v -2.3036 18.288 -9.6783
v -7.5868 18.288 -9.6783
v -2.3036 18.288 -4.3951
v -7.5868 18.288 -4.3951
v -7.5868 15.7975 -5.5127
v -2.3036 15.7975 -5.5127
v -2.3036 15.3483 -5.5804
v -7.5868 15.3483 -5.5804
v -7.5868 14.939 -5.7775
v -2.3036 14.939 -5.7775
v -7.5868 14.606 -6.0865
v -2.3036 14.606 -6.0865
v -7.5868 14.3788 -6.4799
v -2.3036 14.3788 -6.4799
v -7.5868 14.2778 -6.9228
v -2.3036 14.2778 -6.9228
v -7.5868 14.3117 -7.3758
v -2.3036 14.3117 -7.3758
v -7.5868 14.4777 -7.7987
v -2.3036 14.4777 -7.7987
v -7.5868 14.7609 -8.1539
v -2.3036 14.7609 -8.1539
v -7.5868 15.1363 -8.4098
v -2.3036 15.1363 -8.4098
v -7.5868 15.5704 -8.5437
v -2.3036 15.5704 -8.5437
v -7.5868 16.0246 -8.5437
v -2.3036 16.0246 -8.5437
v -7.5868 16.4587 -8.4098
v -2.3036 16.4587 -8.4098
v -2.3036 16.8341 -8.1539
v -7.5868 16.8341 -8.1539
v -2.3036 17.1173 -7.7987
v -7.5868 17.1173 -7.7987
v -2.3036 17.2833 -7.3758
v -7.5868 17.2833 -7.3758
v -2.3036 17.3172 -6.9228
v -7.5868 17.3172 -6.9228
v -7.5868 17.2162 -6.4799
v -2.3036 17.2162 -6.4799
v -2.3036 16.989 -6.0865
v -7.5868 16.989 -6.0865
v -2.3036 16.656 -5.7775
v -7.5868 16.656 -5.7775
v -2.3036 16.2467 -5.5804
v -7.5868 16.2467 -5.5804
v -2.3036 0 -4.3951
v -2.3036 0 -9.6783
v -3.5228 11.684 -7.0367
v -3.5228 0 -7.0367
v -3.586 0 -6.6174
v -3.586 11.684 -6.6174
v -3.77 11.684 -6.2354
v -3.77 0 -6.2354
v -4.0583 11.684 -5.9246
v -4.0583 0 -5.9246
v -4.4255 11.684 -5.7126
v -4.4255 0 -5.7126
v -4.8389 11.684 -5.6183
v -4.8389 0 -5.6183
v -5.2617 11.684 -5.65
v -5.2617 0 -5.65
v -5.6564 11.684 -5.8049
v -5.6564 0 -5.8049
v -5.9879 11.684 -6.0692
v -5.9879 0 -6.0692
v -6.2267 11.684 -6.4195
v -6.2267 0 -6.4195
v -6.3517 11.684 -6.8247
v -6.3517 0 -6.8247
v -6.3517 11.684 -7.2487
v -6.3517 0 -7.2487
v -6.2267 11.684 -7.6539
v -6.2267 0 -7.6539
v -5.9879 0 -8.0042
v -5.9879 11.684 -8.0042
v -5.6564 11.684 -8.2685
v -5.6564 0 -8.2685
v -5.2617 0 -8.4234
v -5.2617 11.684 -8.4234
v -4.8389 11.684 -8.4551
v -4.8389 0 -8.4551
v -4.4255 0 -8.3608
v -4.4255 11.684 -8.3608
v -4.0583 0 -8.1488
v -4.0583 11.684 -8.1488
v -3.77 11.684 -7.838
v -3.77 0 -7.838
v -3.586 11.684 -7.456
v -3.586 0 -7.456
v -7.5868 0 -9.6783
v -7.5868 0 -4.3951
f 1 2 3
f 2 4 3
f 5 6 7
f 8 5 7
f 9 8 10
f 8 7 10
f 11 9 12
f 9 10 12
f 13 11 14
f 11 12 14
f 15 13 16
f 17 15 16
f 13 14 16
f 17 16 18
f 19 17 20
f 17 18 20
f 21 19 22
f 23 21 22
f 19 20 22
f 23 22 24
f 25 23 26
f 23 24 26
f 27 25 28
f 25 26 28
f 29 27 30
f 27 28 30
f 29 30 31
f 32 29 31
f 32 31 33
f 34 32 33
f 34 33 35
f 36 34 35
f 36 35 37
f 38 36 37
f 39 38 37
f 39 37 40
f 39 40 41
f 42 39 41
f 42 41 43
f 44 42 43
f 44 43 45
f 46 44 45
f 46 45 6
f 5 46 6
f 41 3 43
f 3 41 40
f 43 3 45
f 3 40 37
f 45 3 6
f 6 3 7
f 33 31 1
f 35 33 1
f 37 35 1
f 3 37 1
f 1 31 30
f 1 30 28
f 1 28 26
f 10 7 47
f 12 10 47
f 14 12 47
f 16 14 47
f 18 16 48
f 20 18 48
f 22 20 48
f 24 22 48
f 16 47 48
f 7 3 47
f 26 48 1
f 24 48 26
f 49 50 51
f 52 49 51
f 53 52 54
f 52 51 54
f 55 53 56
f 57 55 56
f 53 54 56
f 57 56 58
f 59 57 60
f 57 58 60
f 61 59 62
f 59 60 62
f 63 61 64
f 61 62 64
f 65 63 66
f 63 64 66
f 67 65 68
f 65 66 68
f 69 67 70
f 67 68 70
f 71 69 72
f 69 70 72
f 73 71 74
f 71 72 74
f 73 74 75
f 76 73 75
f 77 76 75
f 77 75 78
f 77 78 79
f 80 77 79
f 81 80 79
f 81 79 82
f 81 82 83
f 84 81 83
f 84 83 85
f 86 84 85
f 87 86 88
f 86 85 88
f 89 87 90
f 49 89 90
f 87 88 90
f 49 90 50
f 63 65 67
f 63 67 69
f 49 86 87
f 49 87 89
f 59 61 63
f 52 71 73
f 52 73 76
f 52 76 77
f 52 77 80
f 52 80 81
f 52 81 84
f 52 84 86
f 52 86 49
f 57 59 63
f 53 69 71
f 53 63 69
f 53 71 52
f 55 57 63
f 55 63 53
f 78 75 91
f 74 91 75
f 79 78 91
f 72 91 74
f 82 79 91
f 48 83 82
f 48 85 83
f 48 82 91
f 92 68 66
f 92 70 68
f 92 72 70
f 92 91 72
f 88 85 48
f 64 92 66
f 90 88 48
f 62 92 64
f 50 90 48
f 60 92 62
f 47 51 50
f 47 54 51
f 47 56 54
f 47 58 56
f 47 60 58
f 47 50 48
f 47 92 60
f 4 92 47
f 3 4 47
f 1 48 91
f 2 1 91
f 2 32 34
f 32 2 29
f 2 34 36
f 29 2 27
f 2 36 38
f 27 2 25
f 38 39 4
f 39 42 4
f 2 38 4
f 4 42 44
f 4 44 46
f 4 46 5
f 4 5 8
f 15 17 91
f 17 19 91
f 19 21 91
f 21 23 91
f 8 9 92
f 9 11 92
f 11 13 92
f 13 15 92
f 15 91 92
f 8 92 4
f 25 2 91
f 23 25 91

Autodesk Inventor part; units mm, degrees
ref_plane "YZ Plane" through (0, 0, 0) normal (1, 0, 0) x (0, 1, 0)
ref_plane "XZ Plane" through (0, 0, 0) normal (0, 1, 0) x (-1, 0, 0)
ref_plane "XY Plane" through (0, 0, 0) normal (0, 0, 1) x (1, 0, 0)
ref_plane "Work Plane2" through (-2.3036, 0, -9.6783) normal (1, 0, 0) x (0, 0, -1)
sketch "Sketch1" plane through (-2.3036, 0, -9.6783) normal (1, 0, 0) x (0, 0, -1)
  line L0 (0, 0) -> (-5.2832, 0) projected
  line L1 (-2.6416, 0) -> (-2.6416, 10.3378)
  line L2 (-2.6416, 10.3378) -> (-2.6416, 11.1315)
  line L3 (-2.6416, 0) -> (-2.6416, 11.5316)
  point P0 (-9.6783, 0)
  dimension "d24" = 11.5316
ref_plane "Work Plane1" through (-2.3036, 0, -9.6783) normal (1, 0, 0) x (0, 0, -1)
sketch "Sketch2" plane through (-2.3036, 0, -9.6783) normal (1, 0, 0) x (0, 0, -1)
  point P0 (-9.6783, 0)
ref_plane "Work Plane3" through (-2.3036, 0, -9.6783) normal (1, 0, 0) x (0, 0, -1)
ref_plane "Work Plane6" through (-7.5868, 0, -9.6783) normal (-1, 0, 0) x (0, 0, 1)
sketch "Sketch5" plane through (-7.5868, 0, -9.6783) normal (-1, 0, 0) x (0, 0, 1)
  line L0 (0, 0) -> (5.2832, 0) projected
  line L1 (2.6416, 0) -> (2.6416, 14.7688)
  line L2 (2.6416, 14.7688) -> (2.6416, 15.7975)
  line L3 (2.6416, 15.7975) -> (2.6416, 18.2867)
  circle A0 centre (2.6416, 15.7975) radius 1.524
  point P0 (9.6783, 0)
  dimension "d25" = 1.0287
  dimension "d26" = 2.4892
  dimension "d27" = 3.048
ref_plane "Work Plane5" through (-7.5868, 0, -9.6783) normal (0, -1, 0) x (1, 0, 0)
sketch "Sketch6" plane through (-7.5868, 0, -9.6783) normal (0, -1, 0) x (1, 0, 0)
  line L0 (0, 0) -> (0, 5.2832) projected
  line L1 (5.2832, 0) -> (0, 0) projected
  line L2 (0, 5.2832) -> (5.2832, 5.2832)
  line L3 (5.2832, 5.2832) -> (5.2832, 0)
  line L4 (5.2832, 0) -> (0, 0)
  line L5 (0, 0) -> (0, 5.2832)
  arc A0 (3.5677, 2.2318) -> (3.582, 3.0171) centre (2.6416, 2.6416) ccw projected
  circle A1 centre (2.6416, 2.6416) radius 1.4224
  point P0 (7.5868, 9.6783)
  dimension "d35" = 2.8448
extrude "Extrusion3" add sketch "Sketch6" against normal blind 18.288 contours L0 L2 L3 L1 | A1
hole "Hole4" at (-7.5868, 15.7975, -7.0367) direction (1, 0, 0) diameter 3.048 end through all
extrude "Extrusion4" cut sketch "Sketch6" against normal blind 11.684 contours A1
thread "Thread1" size "4-40 UNC" class "2B" standard "ANSI Unified Screw Threads" full length
properties part number "rod1"
